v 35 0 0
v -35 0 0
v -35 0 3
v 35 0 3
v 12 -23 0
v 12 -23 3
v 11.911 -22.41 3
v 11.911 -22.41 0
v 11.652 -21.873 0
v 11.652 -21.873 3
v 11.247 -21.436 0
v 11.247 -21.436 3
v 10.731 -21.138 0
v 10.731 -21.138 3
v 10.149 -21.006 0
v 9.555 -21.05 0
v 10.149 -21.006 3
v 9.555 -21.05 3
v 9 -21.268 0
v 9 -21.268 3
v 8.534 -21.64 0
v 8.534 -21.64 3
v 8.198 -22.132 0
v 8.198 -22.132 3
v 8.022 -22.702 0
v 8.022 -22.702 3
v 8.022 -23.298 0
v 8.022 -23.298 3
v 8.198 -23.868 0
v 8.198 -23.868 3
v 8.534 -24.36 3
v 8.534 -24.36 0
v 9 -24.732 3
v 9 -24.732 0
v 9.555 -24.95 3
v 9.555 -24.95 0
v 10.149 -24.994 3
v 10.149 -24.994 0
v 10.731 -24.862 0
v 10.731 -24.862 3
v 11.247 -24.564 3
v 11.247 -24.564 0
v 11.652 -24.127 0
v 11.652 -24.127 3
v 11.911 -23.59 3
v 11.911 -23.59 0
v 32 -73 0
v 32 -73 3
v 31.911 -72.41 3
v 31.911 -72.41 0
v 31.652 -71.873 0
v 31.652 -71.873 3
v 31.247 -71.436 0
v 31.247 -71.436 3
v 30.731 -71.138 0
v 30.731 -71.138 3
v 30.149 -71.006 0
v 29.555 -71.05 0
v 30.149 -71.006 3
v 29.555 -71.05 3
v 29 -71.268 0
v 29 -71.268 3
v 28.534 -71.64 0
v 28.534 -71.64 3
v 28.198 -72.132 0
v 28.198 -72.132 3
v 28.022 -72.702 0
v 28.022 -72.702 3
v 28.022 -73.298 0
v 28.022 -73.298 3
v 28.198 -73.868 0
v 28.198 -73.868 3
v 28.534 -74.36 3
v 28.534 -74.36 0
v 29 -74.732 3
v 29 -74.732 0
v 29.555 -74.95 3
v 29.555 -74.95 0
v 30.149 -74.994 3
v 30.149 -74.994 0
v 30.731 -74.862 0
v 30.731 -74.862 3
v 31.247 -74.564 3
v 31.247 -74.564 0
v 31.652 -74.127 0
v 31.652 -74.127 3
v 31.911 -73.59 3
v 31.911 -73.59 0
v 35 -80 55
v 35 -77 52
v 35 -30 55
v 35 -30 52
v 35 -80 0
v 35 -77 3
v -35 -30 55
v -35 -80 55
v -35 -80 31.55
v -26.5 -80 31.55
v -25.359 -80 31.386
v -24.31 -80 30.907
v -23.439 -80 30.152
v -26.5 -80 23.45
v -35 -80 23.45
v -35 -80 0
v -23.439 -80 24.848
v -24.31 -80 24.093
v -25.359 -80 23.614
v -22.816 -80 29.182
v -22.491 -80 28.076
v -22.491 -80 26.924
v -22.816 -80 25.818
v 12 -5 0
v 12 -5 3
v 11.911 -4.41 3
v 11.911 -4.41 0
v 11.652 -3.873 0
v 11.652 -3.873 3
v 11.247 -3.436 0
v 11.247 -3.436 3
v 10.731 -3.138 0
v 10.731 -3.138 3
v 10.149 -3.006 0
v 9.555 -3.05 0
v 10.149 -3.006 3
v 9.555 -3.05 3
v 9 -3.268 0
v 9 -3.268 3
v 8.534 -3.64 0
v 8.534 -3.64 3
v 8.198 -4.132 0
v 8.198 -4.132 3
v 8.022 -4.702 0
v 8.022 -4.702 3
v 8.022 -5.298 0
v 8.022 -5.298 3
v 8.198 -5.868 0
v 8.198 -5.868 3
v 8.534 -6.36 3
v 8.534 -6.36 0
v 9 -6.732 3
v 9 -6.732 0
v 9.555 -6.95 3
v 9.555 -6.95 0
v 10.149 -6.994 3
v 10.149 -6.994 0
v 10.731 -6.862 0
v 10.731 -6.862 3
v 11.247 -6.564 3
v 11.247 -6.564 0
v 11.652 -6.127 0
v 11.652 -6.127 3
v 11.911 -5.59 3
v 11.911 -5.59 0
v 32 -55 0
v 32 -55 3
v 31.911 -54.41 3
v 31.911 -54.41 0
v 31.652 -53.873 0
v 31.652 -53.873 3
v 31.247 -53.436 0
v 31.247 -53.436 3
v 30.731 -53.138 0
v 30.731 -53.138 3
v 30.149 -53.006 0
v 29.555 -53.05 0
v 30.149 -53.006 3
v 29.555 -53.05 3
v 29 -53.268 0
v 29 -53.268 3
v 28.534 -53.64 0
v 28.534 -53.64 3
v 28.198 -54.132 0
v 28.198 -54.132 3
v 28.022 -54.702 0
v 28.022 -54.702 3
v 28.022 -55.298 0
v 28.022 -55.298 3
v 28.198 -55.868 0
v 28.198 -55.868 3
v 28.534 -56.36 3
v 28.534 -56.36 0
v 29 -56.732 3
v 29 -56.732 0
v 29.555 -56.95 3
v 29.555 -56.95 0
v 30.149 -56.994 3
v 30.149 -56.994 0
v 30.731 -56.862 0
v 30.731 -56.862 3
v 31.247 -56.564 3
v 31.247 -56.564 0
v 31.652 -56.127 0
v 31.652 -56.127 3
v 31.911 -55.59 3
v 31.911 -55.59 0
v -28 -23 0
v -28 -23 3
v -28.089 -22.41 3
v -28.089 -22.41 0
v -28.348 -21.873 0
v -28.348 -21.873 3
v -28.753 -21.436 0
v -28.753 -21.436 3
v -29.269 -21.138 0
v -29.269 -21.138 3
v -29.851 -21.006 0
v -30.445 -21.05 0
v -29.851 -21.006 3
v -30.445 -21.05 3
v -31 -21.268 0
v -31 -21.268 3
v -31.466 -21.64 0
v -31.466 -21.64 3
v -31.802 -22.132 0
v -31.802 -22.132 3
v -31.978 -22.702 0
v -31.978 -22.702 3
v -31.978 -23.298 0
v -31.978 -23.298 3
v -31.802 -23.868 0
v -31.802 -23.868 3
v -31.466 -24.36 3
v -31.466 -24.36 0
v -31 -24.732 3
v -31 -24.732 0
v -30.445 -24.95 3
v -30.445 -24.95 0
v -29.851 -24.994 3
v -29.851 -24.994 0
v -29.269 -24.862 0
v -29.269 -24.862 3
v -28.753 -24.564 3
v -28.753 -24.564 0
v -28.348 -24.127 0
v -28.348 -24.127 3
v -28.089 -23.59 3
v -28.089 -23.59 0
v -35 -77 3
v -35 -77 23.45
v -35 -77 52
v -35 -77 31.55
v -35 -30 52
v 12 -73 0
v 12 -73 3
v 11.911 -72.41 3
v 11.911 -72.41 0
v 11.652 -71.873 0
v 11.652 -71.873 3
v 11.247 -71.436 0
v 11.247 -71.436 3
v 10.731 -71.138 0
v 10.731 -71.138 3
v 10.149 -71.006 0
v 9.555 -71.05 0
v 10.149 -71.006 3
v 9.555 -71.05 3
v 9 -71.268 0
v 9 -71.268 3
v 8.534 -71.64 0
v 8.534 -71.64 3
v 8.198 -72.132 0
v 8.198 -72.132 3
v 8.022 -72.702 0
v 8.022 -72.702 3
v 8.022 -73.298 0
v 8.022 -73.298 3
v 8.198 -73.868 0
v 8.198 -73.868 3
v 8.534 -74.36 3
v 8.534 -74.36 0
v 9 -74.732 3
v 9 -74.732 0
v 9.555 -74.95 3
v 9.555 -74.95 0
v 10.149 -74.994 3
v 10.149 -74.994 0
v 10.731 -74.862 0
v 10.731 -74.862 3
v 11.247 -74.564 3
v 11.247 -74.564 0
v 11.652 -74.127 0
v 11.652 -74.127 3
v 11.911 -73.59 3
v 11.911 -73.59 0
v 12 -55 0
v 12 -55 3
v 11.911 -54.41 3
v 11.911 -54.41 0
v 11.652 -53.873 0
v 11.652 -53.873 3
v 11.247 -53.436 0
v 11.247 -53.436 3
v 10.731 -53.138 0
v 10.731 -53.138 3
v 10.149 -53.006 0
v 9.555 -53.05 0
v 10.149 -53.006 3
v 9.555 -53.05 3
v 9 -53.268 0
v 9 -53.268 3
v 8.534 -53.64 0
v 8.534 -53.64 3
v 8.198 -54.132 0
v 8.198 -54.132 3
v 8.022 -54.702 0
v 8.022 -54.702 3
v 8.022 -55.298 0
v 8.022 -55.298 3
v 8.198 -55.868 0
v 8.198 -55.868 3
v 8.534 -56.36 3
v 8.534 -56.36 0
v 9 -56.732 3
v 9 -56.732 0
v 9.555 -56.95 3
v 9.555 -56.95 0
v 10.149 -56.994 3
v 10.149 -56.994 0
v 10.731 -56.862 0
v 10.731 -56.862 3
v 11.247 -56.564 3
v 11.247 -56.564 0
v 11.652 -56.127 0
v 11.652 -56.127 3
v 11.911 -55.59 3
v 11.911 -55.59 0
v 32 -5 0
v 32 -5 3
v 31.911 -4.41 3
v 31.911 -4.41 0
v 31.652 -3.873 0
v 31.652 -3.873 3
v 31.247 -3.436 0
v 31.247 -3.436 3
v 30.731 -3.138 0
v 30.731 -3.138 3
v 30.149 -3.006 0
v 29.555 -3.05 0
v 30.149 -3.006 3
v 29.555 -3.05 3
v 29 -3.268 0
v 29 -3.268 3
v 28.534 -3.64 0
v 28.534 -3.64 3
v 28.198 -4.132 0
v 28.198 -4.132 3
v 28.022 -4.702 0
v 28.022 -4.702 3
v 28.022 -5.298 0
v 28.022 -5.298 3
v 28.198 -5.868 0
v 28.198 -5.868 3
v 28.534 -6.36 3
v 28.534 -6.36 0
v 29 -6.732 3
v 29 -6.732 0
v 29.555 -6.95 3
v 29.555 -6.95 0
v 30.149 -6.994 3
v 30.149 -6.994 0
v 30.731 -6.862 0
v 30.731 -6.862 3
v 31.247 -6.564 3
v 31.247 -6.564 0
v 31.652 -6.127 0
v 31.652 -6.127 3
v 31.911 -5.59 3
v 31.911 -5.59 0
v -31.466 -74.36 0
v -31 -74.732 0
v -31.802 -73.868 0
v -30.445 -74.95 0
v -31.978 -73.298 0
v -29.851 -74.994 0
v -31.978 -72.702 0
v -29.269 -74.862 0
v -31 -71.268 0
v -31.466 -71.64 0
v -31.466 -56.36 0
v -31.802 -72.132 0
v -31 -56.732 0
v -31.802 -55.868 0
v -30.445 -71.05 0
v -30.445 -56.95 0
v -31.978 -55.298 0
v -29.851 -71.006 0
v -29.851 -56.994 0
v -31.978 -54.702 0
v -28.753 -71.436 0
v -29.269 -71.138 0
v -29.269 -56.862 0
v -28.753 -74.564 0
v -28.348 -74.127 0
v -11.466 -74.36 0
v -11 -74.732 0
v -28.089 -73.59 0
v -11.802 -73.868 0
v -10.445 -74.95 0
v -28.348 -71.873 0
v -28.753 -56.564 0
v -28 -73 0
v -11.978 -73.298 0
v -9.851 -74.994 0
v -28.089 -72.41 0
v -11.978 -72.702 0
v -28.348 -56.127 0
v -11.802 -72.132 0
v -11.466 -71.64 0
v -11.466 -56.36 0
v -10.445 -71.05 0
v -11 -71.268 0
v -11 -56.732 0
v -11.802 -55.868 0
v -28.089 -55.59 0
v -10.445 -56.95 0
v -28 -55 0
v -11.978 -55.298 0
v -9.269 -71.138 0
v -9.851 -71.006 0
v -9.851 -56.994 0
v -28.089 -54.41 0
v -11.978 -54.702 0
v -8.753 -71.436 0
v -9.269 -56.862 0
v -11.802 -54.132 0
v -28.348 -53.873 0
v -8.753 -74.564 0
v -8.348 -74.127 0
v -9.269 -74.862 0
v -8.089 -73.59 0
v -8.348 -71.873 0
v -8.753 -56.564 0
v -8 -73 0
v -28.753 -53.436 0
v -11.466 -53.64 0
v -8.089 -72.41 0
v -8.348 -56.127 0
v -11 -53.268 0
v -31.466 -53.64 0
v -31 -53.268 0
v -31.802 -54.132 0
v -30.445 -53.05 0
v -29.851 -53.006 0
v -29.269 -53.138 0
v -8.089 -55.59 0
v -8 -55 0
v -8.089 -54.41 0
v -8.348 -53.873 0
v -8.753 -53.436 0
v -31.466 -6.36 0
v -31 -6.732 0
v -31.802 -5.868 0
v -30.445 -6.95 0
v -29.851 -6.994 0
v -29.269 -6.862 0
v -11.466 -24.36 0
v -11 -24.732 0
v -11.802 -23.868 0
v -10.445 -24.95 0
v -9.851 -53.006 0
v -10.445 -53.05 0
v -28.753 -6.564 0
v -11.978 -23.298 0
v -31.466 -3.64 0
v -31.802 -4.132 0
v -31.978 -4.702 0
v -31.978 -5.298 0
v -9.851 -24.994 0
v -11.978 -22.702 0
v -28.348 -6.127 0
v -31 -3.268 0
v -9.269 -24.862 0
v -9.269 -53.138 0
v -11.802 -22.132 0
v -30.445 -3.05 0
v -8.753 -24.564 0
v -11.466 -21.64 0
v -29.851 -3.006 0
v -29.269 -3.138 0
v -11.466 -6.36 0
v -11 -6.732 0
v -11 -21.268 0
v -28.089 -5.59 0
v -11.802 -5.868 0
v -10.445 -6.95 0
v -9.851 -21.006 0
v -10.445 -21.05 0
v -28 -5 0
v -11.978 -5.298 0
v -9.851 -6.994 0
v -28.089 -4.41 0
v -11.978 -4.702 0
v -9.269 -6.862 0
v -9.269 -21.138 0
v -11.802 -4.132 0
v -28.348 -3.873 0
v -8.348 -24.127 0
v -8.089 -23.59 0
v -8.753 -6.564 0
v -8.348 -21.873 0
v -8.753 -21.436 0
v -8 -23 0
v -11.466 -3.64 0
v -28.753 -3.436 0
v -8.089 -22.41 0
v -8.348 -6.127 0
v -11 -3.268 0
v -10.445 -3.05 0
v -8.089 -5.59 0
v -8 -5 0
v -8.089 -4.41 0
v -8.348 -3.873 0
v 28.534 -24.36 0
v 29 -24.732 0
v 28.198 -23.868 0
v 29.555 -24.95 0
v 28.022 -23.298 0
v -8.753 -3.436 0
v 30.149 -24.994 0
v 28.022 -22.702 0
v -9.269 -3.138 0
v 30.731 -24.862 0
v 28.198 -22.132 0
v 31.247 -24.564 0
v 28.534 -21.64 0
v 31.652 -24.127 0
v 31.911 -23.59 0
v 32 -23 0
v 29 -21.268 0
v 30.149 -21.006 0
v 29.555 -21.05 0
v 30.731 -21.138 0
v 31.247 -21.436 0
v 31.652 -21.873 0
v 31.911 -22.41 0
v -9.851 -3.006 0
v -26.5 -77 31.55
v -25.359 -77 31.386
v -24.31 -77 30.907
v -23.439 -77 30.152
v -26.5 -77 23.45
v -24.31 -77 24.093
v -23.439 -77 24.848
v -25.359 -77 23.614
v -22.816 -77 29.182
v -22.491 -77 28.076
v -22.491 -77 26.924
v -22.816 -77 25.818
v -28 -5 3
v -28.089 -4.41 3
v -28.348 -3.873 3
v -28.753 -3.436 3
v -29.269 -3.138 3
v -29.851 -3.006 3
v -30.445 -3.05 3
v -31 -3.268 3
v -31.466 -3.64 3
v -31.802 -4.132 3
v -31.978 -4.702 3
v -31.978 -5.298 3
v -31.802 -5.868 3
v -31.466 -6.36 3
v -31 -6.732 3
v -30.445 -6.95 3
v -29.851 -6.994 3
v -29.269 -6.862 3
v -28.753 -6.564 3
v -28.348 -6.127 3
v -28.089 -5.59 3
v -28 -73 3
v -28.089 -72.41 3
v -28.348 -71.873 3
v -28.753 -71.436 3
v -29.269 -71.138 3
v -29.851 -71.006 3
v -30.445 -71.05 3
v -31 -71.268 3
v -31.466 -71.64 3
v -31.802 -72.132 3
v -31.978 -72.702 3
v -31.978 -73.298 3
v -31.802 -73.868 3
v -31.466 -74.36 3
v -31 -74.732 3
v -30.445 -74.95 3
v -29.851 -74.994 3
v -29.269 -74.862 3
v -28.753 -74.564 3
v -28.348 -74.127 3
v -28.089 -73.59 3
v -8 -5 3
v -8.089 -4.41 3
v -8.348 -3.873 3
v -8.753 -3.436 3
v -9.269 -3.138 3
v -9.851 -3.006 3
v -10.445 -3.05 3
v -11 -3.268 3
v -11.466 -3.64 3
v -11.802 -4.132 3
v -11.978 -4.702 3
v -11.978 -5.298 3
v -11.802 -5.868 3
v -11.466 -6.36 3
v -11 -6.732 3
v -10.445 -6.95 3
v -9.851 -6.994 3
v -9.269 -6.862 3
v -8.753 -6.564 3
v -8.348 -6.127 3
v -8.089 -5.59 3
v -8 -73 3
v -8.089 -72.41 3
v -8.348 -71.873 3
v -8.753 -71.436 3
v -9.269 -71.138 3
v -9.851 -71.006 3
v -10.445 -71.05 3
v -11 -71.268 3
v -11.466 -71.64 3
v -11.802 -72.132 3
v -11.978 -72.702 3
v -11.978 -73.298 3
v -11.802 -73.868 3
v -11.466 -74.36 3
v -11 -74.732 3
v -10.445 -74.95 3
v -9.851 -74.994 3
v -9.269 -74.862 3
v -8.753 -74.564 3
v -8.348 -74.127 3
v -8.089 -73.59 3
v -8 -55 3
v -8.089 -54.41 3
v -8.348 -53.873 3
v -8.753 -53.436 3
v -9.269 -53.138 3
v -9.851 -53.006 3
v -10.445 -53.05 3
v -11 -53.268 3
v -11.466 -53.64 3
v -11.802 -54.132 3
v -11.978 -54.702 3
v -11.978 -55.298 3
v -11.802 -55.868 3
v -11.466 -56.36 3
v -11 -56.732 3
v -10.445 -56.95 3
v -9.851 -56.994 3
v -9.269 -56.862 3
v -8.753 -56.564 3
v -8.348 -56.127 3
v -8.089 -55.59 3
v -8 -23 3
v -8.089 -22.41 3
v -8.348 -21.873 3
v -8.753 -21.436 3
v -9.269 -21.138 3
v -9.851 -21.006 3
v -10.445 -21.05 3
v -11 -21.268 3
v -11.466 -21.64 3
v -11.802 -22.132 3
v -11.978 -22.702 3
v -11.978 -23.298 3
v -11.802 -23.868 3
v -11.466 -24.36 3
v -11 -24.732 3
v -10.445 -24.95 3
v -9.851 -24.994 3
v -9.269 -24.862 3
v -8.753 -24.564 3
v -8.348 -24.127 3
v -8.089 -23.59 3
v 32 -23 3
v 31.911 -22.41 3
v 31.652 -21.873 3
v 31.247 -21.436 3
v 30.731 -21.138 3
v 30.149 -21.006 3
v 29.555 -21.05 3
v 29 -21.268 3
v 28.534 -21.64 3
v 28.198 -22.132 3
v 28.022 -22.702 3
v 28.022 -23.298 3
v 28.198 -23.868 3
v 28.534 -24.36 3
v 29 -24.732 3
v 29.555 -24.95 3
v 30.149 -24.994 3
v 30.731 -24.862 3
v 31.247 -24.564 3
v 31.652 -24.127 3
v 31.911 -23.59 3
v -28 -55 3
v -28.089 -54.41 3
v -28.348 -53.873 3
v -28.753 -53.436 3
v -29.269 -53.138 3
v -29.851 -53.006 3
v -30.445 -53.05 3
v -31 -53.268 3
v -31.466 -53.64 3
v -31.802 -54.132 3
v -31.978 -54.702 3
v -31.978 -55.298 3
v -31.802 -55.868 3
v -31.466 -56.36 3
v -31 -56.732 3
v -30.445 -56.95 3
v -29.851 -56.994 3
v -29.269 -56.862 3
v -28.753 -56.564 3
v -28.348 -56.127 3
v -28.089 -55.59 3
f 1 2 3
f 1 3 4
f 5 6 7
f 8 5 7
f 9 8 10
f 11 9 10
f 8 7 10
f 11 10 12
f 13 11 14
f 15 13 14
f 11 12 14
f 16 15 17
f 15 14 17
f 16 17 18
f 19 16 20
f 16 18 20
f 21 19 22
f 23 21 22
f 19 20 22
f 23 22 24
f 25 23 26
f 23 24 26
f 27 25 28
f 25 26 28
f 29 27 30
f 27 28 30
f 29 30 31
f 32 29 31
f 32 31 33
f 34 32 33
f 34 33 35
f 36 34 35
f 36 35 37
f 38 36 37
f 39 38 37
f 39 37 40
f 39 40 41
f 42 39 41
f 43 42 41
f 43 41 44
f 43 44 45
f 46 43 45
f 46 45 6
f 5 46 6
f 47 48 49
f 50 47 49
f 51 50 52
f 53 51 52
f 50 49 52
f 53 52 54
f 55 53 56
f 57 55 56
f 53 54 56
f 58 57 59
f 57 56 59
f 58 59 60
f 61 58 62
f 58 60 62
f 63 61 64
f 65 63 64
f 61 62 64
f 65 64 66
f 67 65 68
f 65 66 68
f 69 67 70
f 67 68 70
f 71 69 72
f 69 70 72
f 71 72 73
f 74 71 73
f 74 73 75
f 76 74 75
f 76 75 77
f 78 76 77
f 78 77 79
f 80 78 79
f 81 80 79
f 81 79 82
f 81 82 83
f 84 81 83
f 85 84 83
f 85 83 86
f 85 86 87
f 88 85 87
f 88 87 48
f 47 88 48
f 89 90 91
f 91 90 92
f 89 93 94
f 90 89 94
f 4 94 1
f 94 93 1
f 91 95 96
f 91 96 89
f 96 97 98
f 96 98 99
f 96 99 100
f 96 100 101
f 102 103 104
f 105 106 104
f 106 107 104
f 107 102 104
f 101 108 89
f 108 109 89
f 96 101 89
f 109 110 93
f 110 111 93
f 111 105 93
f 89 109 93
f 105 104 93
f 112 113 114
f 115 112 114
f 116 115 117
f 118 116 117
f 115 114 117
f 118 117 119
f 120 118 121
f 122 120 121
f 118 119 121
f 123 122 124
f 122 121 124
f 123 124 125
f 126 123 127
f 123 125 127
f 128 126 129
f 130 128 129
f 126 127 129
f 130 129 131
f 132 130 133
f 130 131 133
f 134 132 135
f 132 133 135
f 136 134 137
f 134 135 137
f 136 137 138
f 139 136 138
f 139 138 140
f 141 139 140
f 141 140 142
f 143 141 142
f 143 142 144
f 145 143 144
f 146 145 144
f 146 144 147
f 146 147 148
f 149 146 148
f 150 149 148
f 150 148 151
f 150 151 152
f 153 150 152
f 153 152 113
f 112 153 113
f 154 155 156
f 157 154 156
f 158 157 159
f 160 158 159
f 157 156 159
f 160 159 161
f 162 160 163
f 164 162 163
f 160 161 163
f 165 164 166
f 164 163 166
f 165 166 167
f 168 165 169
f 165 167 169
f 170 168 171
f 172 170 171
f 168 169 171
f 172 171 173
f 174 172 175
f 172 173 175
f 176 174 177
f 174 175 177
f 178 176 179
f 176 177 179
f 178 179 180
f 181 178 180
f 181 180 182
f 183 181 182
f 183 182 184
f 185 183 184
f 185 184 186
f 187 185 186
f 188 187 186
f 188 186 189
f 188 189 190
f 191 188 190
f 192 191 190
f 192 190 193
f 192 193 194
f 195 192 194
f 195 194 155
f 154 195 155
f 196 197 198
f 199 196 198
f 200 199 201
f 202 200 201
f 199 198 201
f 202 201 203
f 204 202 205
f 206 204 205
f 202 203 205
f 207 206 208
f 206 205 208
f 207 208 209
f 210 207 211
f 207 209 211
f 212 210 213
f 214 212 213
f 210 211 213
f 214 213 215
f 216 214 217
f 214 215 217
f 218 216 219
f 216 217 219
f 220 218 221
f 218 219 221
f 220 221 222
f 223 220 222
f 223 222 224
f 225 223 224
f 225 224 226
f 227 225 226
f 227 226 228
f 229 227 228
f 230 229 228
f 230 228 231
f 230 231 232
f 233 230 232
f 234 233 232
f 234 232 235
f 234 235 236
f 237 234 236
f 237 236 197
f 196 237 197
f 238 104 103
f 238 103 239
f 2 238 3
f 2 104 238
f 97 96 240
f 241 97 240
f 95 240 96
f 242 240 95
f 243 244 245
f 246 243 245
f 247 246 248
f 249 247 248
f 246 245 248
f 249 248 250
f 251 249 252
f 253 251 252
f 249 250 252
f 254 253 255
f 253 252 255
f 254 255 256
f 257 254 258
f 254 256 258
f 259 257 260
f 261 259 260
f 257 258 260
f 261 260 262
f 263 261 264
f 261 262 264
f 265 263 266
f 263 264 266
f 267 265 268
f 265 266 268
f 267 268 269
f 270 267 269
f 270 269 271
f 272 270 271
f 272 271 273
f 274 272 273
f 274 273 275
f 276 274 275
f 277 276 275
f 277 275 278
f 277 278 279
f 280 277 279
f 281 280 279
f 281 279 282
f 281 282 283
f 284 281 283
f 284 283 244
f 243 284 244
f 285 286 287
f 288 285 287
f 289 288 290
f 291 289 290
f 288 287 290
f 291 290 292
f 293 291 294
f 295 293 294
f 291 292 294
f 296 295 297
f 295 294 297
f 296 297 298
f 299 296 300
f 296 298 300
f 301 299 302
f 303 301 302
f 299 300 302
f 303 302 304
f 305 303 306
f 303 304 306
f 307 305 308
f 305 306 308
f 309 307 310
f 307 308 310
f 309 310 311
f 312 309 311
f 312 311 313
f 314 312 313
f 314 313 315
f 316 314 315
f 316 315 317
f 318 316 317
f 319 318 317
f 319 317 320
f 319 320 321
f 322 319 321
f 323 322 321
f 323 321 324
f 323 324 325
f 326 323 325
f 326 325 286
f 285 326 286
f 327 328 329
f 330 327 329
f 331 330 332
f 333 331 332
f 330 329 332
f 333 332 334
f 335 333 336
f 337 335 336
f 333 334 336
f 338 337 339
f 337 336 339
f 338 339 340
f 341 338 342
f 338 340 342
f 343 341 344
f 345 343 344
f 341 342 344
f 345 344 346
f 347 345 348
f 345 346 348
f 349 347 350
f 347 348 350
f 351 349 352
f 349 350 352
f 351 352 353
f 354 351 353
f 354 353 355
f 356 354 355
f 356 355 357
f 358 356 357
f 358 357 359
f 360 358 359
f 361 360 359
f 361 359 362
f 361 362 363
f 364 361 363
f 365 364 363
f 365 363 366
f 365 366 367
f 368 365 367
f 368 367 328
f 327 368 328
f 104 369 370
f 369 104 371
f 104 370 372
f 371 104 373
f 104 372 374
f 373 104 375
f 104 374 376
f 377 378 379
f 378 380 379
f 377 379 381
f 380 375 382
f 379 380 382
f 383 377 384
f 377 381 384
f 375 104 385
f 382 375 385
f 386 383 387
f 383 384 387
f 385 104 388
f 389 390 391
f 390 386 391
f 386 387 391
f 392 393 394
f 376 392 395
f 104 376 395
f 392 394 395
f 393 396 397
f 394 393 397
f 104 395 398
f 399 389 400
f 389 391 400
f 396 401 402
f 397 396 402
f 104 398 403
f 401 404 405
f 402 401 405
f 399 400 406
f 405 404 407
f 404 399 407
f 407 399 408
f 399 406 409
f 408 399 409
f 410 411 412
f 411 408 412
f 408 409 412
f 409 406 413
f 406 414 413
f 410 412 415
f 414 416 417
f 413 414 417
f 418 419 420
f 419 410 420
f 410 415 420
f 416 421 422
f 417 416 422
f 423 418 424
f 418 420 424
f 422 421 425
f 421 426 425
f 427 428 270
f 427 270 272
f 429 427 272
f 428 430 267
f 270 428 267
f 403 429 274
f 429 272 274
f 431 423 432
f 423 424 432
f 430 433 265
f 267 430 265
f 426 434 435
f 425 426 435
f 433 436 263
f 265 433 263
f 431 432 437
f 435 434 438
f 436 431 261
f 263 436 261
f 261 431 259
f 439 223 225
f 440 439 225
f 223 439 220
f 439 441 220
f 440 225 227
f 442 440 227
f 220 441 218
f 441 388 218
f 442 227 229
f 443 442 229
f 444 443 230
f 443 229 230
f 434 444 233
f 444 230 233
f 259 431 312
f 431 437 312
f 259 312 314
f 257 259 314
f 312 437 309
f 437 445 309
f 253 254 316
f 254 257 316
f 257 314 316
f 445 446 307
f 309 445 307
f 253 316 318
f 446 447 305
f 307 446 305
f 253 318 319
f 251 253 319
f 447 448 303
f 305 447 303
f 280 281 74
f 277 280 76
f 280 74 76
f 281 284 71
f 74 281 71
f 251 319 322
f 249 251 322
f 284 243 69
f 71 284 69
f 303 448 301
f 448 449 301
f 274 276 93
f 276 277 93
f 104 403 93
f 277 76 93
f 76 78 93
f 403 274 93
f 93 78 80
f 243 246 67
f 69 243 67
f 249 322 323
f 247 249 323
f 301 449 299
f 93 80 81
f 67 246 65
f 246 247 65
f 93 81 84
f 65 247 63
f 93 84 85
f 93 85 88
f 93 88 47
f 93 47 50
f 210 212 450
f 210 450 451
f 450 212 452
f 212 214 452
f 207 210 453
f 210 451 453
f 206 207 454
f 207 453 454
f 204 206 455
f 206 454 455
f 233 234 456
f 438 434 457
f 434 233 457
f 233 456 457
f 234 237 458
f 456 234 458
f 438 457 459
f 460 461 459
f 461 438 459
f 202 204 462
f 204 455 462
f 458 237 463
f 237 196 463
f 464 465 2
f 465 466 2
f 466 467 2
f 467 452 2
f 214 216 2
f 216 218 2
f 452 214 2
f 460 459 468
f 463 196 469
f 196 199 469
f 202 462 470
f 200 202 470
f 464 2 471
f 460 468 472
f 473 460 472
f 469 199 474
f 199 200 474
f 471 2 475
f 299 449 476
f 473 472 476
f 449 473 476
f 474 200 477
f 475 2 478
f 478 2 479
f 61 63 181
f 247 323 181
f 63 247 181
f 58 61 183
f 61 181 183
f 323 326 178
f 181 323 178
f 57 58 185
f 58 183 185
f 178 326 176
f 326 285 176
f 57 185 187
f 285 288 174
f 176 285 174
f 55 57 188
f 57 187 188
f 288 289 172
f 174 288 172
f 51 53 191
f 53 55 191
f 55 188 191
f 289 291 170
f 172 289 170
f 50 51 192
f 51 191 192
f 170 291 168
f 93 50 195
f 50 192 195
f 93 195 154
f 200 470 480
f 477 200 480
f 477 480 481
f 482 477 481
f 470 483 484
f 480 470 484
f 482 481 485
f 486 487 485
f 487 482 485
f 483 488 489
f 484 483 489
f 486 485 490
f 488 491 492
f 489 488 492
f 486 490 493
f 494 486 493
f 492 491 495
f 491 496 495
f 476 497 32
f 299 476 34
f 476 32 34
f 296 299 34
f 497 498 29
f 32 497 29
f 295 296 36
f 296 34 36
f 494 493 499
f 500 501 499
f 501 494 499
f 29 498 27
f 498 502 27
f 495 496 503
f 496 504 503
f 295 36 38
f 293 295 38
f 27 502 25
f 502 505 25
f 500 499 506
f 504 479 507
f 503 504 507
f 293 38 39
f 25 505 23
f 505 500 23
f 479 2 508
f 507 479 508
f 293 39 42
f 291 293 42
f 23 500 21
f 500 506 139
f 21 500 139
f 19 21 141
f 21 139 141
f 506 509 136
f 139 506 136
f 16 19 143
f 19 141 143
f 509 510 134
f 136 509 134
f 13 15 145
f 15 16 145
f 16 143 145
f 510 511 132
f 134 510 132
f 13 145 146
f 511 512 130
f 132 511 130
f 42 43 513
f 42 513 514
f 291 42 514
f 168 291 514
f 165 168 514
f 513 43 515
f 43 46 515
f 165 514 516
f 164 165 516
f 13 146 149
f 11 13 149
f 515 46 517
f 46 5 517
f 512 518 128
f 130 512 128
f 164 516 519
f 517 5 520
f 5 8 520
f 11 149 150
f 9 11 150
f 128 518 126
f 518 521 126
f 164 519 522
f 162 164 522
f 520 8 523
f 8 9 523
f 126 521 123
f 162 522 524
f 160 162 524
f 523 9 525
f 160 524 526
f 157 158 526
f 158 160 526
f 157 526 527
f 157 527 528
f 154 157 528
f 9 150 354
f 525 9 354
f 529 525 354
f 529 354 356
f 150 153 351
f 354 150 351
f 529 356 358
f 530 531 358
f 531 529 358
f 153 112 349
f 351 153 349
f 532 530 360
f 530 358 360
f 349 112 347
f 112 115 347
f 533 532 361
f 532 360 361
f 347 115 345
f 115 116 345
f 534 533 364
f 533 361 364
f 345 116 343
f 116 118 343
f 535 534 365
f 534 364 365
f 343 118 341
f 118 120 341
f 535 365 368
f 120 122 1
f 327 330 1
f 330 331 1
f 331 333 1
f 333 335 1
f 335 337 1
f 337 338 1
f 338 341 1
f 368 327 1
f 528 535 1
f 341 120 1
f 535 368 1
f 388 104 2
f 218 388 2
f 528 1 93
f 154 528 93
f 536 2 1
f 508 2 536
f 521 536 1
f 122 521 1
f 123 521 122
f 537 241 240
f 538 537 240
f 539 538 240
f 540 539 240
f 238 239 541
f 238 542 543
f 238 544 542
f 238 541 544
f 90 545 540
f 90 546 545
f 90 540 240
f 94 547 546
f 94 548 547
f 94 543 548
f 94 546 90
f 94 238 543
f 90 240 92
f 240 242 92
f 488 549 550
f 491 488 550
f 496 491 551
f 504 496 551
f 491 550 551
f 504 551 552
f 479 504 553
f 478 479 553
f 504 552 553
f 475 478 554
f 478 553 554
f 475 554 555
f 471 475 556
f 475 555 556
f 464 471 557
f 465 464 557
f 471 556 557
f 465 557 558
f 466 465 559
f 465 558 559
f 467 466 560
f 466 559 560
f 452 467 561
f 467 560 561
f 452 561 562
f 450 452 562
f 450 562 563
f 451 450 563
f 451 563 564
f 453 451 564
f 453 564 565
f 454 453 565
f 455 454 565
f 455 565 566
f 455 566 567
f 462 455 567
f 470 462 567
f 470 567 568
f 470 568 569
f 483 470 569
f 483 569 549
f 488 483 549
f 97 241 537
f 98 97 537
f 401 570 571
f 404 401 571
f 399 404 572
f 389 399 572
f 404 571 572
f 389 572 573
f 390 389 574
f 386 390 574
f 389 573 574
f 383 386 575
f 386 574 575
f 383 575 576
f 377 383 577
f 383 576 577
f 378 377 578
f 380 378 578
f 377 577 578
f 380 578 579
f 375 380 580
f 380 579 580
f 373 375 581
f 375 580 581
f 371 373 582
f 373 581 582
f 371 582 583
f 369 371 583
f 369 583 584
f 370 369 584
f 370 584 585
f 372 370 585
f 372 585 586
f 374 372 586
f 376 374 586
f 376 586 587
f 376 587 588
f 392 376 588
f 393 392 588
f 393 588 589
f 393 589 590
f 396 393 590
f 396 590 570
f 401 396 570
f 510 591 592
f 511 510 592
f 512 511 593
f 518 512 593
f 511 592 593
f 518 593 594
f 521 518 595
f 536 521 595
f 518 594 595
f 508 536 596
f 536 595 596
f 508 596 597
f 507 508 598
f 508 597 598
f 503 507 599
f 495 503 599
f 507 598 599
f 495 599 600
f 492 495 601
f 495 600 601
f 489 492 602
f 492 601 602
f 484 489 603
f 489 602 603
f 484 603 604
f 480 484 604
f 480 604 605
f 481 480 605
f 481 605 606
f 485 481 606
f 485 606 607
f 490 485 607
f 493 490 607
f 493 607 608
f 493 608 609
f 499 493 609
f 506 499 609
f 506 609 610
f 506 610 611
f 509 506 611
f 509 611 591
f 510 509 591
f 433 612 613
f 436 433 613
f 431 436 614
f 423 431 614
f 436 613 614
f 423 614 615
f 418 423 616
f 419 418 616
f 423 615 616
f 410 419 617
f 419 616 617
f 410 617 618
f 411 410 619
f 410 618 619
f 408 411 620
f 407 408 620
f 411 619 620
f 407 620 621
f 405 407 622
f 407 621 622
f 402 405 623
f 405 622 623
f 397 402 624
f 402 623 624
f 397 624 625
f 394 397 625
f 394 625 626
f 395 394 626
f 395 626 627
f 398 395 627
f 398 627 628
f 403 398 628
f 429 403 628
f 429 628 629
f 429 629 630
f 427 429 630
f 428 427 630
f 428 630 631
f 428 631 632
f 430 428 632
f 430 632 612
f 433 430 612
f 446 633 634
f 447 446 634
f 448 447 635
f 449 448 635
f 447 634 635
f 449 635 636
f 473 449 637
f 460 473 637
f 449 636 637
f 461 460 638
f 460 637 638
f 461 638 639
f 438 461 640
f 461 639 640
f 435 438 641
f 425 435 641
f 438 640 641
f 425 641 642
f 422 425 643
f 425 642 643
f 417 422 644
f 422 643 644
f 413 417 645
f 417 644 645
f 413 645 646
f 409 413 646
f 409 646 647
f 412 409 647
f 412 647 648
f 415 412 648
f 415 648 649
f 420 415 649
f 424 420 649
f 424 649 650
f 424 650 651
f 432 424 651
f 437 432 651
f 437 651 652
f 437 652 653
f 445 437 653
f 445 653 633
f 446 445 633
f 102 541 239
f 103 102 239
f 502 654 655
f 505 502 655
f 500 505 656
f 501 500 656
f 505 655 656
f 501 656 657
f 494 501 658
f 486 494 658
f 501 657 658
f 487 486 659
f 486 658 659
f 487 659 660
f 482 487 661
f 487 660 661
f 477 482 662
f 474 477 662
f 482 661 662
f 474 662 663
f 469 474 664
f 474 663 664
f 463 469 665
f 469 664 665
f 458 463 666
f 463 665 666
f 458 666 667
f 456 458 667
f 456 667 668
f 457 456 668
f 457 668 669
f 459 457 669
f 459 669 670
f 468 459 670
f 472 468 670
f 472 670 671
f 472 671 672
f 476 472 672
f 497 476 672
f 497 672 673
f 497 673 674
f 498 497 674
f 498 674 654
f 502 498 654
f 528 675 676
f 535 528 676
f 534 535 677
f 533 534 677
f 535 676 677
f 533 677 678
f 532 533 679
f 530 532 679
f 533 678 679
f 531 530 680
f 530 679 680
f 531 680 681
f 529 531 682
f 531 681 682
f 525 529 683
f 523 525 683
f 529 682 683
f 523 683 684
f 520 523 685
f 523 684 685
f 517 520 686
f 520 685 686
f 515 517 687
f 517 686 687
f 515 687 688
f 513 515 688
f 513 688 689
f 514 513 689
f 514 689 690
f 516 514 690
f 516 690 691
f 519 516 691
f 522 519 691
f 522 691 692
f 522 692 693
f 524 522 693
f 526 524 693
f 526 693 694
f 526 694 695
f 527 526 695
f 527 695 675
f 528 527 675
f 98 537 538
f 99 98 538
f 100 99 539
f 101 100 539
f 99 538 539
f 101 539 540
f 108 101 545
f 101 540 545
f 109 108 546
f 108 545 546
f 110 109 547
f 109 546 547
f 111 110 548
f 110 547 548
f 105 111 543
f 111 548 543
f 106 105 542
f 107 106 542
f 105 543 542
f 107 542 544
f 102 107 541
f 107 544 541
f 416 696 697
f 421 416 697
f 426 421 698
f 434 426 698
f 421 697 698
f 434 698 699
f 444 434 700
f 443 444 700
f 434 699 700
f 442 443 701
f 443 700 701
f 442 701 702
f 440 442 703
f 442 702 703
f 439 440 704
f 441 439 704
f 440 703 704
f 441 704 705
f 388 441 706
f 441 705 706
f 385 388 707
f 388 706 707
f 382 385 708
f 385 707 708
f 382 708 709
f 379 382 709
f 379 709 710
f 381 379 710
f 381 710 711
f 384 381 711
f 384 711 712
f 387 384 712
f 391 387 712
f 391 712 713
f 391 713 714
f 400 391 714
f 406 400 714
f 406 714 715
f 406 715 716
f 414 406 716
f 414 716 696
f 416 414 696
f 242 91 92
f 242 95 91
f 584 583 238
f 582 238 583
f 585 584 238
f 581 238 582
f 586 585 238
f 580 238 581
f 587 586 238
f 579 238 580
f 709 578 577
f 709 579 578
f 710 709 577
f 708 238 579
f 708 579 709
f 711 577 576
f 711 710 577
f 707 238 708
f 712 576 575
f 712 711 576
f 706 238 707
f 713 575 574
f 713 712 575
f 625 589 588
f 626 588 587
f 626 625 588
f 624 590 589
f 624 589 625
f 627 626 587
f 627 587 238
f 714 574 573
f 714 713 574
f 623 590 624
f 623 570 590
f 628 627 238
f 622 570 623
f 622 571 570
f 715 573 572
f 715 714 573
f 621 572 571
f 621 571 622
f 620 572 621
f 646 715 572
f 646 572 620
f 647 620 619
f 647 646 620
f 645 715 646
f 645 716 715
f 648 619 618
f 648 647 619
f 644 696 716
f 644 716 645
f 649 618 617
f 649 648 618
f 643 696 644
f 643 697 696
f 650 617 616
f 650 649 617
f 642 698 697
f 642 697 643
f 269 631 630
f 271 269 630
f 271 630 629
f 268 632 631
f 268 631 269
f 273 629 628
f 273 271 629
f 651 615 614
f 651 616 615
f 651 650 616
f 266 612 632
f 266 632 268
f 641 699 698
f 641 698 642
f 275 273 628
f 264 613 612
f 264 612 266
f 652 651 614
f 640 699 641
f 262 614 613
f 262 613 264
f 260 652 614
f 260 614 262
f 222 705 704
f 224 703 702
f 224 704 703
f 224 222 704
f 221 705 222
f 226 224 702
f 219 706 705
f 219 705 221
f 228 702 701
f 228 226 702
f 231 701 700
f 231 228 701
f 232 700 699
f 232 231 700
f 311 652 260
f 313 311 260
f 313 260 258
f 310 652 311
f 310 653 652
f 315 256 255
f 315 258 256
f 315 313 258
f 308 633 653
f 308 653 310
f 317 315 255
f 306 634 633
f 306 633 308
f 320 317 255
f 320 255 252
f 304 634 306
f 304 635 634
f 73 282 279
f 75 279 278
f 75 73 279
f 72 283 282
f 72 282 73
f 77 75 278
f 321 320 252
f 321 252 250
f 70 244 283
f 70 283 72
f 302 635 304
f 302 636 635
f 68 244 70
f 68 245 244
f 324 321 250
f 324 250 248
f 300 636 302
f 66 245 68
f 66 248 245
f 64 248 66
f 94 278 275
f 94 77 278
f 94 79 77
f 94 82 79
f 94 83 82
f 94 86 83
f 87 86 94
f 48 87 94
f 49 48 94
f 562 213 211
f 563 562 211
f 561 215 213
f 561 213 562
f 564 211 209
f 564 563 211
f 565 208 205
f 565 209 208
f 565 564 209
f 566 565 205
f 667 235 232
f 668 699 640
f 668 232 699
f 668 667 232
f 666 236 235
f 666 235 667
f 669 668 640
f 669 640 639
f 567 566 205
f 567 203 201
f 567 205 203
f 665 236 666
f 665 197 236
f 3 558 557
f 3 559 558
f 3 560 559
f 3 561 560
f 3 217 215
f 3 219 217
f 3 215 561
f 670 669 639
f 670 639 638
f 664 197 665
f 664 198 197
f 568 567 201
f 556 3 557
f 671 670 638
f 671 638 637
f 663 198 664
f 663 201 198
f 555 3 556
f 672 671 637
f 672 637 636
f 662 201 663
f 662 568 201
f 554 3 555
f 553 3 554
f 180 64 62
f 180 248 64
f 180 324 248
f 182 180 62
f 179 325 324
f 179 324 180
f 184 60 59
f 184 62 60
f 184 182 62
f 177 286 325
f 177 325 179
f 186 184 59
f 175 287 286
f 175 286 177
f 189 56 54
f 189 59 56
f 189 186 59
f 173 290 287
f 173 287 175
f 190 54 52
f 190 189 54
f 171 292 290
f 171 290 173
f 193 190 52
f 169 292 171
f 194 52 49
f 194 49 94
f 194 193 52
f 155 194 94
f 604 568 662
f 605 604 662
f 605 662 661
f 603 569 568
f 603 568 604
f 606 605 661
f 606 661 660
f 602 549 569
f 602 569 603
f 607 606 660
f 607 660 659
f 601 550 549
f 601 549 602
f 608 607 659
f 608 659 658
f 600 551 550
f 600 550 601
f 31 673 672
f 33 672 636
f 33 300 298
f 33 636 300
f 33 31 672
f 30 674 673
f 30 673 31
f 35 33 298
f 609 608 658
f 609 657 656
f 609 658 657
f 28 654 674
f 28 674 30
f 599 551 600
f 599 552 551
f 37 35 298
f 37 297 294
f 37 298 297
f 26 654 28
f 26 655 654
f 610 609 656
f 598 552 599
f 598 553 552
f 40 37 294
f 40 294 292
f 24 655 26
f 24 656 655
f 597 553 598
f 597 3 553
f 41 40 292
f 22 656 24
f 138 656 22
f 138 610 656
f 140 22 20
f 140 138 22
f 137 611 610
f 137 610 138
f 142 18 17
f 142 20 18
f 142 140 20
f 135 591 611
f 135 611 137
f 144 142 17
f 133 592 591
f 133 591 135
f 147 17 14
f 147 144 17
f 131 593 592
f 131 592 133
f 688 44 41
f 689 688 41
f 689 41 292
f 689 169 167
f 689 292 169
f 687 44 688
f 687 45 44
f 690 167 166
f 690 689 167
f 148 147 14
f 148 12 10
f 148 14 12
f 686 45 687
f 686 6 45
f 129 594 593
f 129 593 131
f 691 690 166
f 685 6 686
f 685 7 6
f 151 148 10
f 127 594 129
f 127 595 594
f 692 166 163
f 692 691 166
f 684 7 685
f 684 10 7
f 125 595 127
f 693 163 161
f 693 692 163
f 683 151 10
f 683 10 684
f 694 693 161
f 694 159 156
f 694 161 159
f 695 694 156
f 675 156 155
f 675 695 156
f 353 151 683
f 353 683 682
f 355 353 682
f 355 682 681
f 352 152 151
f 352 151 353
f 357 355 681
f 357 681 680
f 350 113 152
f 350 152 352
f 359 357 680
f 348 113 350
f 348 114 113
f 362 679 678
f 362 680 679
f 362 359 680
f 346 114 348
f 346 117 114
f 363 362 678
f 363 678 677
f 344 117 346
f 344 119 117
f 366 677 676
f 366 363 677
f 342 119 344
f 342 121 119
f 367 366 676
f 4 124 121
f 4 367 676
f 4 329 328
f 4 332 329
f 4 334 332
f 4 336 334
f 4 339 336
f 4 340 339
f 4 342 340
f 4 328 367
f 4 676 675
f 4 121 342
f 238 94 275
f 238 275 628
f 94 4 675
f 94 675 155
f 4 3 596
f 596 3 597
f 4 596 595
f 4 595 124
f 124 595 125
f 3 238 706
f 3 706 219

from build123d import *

# Parameters (mm, degrees)
SKETCH1_W               = 70
SKETCH1_H               = 80
BOSS_EXTRUDE1_DEPTH     = 55
CUT_EXTRUDE1_DEPTH      = 104.198837203
CUT_EXTRUDE1_DEPTH_BACK = 104.198837203
SKETCH2_W               = 27.5
SKETCH2_H               = 30
SHELL1_T                = -3
CUT_EXTRUDE2_DEPTH      = 101.891030325
SKETCH9_R               = 2
CUT_EXTRUDE3_DEPTH      = 102.631687972
LPATTERN1_COUNT         = 2
LPATTERN1_PITCH         = 40
LPATTERN1_COUNT_DIR2    = 2
LPATTERN1_PITCH_DIR2    = 50


with BuildPart() as part:
    # Sketch1 → Boss-Extrude1 (new body)
    with BuildSketch(Plane.XY):
        with Locations((0, -40)):
            Rectangle(SKETCH1_W, SKETCH1_H)
    extrude(amount=BOSS_EXTRUDE1_DEPTH)

    # Sketch2 → Cut-Extrude1 (cut, two sides: drawn at the far end of the back side and taken through both)
    with BuildSketch(Plane(origin=(0, 0, 0), x_dir=(0, 0, -1), z_dir=(1, 0, 0)).offset(-CUT_EXTRUDE1_DEPTH_BACK)):
        with Locations((-41.25, -15)):
            Rectangle(SKETCH2_W, SKETCH2_H)
    extrude(amount=CUT_EXTRUDE1_DEPTH + CUT_EXTRUDE1_DEPTH_BACK, mode=Mode.SUBTRACT)

    # Shell1
    shell1_openings = [part.faces().sort_by_distance(p)[0] for p in [
        (0, 0, 13.75),
        (35, -45.769230769, 24.326923077),
        (0, -15, 27.5),
        (-35, -45.769230769, 24.326923077),
        (0, -30, 41.25),
    ]]
    offset(amount=SHELL1_T, openings=shell1_openings, kind=Kind.INTERSECTION)

    # Sketch8 → Cut-Extrude2 (cut, through all)
    with BuildSketch(Plane(origin=(0, -77, 0), x_dir=(1, 0, 0), z_dir=(0, 1, 0))):
        with BuildLine():
            Line((-26.5, -23.45), (-35, -23.45))
            Line((-35, -23.45), (-35, -31.55))
            Line((-35, -31.55), (-26.5, -31.55))
            ThreePointArc((-26.5, -31.55), (-22.45, -27.5), (-26.5, -23.45))
        make_face()
    extrude(amount=-CUT_EXTRUDE2_DEPTH, mode=Mode.SUBTRACT)

    # Sketch9 → Cut-Extrude3 (cut, through all)
    with BuildSketch(Plane.XY.offset(3)):
        with Locations((-30, -5)):
            Circle(SKETCH9_R)
        with Locations((-10, -5)):
            Circle(SKETCH9_R)
        with Locations((-30, -23)):
            Circle(SKETCH9_R)
        with Locations((-10, -23)):
            Circle(SKETCH9_R)
    cut_extrude3 = extrude(amount=-CUT_EXTRUDE3_DEPTH, mode=Mode.SUBTRACT)

    # LPattern1: Cut-Extrude3 2 × 2
    with Locations(*[(i * LPATTERN1_PITCH, -j * LPATTERN1_PITCH_DIR2, 0) for i in range(LPATTERN1_COUNT) for j in range(LPATTERN1_COUNT_DIR2) if (i, j) != (0, 0)]):
        add(cut_extrude3, mode=Mode.SUBTRACT)


solid = part.part
